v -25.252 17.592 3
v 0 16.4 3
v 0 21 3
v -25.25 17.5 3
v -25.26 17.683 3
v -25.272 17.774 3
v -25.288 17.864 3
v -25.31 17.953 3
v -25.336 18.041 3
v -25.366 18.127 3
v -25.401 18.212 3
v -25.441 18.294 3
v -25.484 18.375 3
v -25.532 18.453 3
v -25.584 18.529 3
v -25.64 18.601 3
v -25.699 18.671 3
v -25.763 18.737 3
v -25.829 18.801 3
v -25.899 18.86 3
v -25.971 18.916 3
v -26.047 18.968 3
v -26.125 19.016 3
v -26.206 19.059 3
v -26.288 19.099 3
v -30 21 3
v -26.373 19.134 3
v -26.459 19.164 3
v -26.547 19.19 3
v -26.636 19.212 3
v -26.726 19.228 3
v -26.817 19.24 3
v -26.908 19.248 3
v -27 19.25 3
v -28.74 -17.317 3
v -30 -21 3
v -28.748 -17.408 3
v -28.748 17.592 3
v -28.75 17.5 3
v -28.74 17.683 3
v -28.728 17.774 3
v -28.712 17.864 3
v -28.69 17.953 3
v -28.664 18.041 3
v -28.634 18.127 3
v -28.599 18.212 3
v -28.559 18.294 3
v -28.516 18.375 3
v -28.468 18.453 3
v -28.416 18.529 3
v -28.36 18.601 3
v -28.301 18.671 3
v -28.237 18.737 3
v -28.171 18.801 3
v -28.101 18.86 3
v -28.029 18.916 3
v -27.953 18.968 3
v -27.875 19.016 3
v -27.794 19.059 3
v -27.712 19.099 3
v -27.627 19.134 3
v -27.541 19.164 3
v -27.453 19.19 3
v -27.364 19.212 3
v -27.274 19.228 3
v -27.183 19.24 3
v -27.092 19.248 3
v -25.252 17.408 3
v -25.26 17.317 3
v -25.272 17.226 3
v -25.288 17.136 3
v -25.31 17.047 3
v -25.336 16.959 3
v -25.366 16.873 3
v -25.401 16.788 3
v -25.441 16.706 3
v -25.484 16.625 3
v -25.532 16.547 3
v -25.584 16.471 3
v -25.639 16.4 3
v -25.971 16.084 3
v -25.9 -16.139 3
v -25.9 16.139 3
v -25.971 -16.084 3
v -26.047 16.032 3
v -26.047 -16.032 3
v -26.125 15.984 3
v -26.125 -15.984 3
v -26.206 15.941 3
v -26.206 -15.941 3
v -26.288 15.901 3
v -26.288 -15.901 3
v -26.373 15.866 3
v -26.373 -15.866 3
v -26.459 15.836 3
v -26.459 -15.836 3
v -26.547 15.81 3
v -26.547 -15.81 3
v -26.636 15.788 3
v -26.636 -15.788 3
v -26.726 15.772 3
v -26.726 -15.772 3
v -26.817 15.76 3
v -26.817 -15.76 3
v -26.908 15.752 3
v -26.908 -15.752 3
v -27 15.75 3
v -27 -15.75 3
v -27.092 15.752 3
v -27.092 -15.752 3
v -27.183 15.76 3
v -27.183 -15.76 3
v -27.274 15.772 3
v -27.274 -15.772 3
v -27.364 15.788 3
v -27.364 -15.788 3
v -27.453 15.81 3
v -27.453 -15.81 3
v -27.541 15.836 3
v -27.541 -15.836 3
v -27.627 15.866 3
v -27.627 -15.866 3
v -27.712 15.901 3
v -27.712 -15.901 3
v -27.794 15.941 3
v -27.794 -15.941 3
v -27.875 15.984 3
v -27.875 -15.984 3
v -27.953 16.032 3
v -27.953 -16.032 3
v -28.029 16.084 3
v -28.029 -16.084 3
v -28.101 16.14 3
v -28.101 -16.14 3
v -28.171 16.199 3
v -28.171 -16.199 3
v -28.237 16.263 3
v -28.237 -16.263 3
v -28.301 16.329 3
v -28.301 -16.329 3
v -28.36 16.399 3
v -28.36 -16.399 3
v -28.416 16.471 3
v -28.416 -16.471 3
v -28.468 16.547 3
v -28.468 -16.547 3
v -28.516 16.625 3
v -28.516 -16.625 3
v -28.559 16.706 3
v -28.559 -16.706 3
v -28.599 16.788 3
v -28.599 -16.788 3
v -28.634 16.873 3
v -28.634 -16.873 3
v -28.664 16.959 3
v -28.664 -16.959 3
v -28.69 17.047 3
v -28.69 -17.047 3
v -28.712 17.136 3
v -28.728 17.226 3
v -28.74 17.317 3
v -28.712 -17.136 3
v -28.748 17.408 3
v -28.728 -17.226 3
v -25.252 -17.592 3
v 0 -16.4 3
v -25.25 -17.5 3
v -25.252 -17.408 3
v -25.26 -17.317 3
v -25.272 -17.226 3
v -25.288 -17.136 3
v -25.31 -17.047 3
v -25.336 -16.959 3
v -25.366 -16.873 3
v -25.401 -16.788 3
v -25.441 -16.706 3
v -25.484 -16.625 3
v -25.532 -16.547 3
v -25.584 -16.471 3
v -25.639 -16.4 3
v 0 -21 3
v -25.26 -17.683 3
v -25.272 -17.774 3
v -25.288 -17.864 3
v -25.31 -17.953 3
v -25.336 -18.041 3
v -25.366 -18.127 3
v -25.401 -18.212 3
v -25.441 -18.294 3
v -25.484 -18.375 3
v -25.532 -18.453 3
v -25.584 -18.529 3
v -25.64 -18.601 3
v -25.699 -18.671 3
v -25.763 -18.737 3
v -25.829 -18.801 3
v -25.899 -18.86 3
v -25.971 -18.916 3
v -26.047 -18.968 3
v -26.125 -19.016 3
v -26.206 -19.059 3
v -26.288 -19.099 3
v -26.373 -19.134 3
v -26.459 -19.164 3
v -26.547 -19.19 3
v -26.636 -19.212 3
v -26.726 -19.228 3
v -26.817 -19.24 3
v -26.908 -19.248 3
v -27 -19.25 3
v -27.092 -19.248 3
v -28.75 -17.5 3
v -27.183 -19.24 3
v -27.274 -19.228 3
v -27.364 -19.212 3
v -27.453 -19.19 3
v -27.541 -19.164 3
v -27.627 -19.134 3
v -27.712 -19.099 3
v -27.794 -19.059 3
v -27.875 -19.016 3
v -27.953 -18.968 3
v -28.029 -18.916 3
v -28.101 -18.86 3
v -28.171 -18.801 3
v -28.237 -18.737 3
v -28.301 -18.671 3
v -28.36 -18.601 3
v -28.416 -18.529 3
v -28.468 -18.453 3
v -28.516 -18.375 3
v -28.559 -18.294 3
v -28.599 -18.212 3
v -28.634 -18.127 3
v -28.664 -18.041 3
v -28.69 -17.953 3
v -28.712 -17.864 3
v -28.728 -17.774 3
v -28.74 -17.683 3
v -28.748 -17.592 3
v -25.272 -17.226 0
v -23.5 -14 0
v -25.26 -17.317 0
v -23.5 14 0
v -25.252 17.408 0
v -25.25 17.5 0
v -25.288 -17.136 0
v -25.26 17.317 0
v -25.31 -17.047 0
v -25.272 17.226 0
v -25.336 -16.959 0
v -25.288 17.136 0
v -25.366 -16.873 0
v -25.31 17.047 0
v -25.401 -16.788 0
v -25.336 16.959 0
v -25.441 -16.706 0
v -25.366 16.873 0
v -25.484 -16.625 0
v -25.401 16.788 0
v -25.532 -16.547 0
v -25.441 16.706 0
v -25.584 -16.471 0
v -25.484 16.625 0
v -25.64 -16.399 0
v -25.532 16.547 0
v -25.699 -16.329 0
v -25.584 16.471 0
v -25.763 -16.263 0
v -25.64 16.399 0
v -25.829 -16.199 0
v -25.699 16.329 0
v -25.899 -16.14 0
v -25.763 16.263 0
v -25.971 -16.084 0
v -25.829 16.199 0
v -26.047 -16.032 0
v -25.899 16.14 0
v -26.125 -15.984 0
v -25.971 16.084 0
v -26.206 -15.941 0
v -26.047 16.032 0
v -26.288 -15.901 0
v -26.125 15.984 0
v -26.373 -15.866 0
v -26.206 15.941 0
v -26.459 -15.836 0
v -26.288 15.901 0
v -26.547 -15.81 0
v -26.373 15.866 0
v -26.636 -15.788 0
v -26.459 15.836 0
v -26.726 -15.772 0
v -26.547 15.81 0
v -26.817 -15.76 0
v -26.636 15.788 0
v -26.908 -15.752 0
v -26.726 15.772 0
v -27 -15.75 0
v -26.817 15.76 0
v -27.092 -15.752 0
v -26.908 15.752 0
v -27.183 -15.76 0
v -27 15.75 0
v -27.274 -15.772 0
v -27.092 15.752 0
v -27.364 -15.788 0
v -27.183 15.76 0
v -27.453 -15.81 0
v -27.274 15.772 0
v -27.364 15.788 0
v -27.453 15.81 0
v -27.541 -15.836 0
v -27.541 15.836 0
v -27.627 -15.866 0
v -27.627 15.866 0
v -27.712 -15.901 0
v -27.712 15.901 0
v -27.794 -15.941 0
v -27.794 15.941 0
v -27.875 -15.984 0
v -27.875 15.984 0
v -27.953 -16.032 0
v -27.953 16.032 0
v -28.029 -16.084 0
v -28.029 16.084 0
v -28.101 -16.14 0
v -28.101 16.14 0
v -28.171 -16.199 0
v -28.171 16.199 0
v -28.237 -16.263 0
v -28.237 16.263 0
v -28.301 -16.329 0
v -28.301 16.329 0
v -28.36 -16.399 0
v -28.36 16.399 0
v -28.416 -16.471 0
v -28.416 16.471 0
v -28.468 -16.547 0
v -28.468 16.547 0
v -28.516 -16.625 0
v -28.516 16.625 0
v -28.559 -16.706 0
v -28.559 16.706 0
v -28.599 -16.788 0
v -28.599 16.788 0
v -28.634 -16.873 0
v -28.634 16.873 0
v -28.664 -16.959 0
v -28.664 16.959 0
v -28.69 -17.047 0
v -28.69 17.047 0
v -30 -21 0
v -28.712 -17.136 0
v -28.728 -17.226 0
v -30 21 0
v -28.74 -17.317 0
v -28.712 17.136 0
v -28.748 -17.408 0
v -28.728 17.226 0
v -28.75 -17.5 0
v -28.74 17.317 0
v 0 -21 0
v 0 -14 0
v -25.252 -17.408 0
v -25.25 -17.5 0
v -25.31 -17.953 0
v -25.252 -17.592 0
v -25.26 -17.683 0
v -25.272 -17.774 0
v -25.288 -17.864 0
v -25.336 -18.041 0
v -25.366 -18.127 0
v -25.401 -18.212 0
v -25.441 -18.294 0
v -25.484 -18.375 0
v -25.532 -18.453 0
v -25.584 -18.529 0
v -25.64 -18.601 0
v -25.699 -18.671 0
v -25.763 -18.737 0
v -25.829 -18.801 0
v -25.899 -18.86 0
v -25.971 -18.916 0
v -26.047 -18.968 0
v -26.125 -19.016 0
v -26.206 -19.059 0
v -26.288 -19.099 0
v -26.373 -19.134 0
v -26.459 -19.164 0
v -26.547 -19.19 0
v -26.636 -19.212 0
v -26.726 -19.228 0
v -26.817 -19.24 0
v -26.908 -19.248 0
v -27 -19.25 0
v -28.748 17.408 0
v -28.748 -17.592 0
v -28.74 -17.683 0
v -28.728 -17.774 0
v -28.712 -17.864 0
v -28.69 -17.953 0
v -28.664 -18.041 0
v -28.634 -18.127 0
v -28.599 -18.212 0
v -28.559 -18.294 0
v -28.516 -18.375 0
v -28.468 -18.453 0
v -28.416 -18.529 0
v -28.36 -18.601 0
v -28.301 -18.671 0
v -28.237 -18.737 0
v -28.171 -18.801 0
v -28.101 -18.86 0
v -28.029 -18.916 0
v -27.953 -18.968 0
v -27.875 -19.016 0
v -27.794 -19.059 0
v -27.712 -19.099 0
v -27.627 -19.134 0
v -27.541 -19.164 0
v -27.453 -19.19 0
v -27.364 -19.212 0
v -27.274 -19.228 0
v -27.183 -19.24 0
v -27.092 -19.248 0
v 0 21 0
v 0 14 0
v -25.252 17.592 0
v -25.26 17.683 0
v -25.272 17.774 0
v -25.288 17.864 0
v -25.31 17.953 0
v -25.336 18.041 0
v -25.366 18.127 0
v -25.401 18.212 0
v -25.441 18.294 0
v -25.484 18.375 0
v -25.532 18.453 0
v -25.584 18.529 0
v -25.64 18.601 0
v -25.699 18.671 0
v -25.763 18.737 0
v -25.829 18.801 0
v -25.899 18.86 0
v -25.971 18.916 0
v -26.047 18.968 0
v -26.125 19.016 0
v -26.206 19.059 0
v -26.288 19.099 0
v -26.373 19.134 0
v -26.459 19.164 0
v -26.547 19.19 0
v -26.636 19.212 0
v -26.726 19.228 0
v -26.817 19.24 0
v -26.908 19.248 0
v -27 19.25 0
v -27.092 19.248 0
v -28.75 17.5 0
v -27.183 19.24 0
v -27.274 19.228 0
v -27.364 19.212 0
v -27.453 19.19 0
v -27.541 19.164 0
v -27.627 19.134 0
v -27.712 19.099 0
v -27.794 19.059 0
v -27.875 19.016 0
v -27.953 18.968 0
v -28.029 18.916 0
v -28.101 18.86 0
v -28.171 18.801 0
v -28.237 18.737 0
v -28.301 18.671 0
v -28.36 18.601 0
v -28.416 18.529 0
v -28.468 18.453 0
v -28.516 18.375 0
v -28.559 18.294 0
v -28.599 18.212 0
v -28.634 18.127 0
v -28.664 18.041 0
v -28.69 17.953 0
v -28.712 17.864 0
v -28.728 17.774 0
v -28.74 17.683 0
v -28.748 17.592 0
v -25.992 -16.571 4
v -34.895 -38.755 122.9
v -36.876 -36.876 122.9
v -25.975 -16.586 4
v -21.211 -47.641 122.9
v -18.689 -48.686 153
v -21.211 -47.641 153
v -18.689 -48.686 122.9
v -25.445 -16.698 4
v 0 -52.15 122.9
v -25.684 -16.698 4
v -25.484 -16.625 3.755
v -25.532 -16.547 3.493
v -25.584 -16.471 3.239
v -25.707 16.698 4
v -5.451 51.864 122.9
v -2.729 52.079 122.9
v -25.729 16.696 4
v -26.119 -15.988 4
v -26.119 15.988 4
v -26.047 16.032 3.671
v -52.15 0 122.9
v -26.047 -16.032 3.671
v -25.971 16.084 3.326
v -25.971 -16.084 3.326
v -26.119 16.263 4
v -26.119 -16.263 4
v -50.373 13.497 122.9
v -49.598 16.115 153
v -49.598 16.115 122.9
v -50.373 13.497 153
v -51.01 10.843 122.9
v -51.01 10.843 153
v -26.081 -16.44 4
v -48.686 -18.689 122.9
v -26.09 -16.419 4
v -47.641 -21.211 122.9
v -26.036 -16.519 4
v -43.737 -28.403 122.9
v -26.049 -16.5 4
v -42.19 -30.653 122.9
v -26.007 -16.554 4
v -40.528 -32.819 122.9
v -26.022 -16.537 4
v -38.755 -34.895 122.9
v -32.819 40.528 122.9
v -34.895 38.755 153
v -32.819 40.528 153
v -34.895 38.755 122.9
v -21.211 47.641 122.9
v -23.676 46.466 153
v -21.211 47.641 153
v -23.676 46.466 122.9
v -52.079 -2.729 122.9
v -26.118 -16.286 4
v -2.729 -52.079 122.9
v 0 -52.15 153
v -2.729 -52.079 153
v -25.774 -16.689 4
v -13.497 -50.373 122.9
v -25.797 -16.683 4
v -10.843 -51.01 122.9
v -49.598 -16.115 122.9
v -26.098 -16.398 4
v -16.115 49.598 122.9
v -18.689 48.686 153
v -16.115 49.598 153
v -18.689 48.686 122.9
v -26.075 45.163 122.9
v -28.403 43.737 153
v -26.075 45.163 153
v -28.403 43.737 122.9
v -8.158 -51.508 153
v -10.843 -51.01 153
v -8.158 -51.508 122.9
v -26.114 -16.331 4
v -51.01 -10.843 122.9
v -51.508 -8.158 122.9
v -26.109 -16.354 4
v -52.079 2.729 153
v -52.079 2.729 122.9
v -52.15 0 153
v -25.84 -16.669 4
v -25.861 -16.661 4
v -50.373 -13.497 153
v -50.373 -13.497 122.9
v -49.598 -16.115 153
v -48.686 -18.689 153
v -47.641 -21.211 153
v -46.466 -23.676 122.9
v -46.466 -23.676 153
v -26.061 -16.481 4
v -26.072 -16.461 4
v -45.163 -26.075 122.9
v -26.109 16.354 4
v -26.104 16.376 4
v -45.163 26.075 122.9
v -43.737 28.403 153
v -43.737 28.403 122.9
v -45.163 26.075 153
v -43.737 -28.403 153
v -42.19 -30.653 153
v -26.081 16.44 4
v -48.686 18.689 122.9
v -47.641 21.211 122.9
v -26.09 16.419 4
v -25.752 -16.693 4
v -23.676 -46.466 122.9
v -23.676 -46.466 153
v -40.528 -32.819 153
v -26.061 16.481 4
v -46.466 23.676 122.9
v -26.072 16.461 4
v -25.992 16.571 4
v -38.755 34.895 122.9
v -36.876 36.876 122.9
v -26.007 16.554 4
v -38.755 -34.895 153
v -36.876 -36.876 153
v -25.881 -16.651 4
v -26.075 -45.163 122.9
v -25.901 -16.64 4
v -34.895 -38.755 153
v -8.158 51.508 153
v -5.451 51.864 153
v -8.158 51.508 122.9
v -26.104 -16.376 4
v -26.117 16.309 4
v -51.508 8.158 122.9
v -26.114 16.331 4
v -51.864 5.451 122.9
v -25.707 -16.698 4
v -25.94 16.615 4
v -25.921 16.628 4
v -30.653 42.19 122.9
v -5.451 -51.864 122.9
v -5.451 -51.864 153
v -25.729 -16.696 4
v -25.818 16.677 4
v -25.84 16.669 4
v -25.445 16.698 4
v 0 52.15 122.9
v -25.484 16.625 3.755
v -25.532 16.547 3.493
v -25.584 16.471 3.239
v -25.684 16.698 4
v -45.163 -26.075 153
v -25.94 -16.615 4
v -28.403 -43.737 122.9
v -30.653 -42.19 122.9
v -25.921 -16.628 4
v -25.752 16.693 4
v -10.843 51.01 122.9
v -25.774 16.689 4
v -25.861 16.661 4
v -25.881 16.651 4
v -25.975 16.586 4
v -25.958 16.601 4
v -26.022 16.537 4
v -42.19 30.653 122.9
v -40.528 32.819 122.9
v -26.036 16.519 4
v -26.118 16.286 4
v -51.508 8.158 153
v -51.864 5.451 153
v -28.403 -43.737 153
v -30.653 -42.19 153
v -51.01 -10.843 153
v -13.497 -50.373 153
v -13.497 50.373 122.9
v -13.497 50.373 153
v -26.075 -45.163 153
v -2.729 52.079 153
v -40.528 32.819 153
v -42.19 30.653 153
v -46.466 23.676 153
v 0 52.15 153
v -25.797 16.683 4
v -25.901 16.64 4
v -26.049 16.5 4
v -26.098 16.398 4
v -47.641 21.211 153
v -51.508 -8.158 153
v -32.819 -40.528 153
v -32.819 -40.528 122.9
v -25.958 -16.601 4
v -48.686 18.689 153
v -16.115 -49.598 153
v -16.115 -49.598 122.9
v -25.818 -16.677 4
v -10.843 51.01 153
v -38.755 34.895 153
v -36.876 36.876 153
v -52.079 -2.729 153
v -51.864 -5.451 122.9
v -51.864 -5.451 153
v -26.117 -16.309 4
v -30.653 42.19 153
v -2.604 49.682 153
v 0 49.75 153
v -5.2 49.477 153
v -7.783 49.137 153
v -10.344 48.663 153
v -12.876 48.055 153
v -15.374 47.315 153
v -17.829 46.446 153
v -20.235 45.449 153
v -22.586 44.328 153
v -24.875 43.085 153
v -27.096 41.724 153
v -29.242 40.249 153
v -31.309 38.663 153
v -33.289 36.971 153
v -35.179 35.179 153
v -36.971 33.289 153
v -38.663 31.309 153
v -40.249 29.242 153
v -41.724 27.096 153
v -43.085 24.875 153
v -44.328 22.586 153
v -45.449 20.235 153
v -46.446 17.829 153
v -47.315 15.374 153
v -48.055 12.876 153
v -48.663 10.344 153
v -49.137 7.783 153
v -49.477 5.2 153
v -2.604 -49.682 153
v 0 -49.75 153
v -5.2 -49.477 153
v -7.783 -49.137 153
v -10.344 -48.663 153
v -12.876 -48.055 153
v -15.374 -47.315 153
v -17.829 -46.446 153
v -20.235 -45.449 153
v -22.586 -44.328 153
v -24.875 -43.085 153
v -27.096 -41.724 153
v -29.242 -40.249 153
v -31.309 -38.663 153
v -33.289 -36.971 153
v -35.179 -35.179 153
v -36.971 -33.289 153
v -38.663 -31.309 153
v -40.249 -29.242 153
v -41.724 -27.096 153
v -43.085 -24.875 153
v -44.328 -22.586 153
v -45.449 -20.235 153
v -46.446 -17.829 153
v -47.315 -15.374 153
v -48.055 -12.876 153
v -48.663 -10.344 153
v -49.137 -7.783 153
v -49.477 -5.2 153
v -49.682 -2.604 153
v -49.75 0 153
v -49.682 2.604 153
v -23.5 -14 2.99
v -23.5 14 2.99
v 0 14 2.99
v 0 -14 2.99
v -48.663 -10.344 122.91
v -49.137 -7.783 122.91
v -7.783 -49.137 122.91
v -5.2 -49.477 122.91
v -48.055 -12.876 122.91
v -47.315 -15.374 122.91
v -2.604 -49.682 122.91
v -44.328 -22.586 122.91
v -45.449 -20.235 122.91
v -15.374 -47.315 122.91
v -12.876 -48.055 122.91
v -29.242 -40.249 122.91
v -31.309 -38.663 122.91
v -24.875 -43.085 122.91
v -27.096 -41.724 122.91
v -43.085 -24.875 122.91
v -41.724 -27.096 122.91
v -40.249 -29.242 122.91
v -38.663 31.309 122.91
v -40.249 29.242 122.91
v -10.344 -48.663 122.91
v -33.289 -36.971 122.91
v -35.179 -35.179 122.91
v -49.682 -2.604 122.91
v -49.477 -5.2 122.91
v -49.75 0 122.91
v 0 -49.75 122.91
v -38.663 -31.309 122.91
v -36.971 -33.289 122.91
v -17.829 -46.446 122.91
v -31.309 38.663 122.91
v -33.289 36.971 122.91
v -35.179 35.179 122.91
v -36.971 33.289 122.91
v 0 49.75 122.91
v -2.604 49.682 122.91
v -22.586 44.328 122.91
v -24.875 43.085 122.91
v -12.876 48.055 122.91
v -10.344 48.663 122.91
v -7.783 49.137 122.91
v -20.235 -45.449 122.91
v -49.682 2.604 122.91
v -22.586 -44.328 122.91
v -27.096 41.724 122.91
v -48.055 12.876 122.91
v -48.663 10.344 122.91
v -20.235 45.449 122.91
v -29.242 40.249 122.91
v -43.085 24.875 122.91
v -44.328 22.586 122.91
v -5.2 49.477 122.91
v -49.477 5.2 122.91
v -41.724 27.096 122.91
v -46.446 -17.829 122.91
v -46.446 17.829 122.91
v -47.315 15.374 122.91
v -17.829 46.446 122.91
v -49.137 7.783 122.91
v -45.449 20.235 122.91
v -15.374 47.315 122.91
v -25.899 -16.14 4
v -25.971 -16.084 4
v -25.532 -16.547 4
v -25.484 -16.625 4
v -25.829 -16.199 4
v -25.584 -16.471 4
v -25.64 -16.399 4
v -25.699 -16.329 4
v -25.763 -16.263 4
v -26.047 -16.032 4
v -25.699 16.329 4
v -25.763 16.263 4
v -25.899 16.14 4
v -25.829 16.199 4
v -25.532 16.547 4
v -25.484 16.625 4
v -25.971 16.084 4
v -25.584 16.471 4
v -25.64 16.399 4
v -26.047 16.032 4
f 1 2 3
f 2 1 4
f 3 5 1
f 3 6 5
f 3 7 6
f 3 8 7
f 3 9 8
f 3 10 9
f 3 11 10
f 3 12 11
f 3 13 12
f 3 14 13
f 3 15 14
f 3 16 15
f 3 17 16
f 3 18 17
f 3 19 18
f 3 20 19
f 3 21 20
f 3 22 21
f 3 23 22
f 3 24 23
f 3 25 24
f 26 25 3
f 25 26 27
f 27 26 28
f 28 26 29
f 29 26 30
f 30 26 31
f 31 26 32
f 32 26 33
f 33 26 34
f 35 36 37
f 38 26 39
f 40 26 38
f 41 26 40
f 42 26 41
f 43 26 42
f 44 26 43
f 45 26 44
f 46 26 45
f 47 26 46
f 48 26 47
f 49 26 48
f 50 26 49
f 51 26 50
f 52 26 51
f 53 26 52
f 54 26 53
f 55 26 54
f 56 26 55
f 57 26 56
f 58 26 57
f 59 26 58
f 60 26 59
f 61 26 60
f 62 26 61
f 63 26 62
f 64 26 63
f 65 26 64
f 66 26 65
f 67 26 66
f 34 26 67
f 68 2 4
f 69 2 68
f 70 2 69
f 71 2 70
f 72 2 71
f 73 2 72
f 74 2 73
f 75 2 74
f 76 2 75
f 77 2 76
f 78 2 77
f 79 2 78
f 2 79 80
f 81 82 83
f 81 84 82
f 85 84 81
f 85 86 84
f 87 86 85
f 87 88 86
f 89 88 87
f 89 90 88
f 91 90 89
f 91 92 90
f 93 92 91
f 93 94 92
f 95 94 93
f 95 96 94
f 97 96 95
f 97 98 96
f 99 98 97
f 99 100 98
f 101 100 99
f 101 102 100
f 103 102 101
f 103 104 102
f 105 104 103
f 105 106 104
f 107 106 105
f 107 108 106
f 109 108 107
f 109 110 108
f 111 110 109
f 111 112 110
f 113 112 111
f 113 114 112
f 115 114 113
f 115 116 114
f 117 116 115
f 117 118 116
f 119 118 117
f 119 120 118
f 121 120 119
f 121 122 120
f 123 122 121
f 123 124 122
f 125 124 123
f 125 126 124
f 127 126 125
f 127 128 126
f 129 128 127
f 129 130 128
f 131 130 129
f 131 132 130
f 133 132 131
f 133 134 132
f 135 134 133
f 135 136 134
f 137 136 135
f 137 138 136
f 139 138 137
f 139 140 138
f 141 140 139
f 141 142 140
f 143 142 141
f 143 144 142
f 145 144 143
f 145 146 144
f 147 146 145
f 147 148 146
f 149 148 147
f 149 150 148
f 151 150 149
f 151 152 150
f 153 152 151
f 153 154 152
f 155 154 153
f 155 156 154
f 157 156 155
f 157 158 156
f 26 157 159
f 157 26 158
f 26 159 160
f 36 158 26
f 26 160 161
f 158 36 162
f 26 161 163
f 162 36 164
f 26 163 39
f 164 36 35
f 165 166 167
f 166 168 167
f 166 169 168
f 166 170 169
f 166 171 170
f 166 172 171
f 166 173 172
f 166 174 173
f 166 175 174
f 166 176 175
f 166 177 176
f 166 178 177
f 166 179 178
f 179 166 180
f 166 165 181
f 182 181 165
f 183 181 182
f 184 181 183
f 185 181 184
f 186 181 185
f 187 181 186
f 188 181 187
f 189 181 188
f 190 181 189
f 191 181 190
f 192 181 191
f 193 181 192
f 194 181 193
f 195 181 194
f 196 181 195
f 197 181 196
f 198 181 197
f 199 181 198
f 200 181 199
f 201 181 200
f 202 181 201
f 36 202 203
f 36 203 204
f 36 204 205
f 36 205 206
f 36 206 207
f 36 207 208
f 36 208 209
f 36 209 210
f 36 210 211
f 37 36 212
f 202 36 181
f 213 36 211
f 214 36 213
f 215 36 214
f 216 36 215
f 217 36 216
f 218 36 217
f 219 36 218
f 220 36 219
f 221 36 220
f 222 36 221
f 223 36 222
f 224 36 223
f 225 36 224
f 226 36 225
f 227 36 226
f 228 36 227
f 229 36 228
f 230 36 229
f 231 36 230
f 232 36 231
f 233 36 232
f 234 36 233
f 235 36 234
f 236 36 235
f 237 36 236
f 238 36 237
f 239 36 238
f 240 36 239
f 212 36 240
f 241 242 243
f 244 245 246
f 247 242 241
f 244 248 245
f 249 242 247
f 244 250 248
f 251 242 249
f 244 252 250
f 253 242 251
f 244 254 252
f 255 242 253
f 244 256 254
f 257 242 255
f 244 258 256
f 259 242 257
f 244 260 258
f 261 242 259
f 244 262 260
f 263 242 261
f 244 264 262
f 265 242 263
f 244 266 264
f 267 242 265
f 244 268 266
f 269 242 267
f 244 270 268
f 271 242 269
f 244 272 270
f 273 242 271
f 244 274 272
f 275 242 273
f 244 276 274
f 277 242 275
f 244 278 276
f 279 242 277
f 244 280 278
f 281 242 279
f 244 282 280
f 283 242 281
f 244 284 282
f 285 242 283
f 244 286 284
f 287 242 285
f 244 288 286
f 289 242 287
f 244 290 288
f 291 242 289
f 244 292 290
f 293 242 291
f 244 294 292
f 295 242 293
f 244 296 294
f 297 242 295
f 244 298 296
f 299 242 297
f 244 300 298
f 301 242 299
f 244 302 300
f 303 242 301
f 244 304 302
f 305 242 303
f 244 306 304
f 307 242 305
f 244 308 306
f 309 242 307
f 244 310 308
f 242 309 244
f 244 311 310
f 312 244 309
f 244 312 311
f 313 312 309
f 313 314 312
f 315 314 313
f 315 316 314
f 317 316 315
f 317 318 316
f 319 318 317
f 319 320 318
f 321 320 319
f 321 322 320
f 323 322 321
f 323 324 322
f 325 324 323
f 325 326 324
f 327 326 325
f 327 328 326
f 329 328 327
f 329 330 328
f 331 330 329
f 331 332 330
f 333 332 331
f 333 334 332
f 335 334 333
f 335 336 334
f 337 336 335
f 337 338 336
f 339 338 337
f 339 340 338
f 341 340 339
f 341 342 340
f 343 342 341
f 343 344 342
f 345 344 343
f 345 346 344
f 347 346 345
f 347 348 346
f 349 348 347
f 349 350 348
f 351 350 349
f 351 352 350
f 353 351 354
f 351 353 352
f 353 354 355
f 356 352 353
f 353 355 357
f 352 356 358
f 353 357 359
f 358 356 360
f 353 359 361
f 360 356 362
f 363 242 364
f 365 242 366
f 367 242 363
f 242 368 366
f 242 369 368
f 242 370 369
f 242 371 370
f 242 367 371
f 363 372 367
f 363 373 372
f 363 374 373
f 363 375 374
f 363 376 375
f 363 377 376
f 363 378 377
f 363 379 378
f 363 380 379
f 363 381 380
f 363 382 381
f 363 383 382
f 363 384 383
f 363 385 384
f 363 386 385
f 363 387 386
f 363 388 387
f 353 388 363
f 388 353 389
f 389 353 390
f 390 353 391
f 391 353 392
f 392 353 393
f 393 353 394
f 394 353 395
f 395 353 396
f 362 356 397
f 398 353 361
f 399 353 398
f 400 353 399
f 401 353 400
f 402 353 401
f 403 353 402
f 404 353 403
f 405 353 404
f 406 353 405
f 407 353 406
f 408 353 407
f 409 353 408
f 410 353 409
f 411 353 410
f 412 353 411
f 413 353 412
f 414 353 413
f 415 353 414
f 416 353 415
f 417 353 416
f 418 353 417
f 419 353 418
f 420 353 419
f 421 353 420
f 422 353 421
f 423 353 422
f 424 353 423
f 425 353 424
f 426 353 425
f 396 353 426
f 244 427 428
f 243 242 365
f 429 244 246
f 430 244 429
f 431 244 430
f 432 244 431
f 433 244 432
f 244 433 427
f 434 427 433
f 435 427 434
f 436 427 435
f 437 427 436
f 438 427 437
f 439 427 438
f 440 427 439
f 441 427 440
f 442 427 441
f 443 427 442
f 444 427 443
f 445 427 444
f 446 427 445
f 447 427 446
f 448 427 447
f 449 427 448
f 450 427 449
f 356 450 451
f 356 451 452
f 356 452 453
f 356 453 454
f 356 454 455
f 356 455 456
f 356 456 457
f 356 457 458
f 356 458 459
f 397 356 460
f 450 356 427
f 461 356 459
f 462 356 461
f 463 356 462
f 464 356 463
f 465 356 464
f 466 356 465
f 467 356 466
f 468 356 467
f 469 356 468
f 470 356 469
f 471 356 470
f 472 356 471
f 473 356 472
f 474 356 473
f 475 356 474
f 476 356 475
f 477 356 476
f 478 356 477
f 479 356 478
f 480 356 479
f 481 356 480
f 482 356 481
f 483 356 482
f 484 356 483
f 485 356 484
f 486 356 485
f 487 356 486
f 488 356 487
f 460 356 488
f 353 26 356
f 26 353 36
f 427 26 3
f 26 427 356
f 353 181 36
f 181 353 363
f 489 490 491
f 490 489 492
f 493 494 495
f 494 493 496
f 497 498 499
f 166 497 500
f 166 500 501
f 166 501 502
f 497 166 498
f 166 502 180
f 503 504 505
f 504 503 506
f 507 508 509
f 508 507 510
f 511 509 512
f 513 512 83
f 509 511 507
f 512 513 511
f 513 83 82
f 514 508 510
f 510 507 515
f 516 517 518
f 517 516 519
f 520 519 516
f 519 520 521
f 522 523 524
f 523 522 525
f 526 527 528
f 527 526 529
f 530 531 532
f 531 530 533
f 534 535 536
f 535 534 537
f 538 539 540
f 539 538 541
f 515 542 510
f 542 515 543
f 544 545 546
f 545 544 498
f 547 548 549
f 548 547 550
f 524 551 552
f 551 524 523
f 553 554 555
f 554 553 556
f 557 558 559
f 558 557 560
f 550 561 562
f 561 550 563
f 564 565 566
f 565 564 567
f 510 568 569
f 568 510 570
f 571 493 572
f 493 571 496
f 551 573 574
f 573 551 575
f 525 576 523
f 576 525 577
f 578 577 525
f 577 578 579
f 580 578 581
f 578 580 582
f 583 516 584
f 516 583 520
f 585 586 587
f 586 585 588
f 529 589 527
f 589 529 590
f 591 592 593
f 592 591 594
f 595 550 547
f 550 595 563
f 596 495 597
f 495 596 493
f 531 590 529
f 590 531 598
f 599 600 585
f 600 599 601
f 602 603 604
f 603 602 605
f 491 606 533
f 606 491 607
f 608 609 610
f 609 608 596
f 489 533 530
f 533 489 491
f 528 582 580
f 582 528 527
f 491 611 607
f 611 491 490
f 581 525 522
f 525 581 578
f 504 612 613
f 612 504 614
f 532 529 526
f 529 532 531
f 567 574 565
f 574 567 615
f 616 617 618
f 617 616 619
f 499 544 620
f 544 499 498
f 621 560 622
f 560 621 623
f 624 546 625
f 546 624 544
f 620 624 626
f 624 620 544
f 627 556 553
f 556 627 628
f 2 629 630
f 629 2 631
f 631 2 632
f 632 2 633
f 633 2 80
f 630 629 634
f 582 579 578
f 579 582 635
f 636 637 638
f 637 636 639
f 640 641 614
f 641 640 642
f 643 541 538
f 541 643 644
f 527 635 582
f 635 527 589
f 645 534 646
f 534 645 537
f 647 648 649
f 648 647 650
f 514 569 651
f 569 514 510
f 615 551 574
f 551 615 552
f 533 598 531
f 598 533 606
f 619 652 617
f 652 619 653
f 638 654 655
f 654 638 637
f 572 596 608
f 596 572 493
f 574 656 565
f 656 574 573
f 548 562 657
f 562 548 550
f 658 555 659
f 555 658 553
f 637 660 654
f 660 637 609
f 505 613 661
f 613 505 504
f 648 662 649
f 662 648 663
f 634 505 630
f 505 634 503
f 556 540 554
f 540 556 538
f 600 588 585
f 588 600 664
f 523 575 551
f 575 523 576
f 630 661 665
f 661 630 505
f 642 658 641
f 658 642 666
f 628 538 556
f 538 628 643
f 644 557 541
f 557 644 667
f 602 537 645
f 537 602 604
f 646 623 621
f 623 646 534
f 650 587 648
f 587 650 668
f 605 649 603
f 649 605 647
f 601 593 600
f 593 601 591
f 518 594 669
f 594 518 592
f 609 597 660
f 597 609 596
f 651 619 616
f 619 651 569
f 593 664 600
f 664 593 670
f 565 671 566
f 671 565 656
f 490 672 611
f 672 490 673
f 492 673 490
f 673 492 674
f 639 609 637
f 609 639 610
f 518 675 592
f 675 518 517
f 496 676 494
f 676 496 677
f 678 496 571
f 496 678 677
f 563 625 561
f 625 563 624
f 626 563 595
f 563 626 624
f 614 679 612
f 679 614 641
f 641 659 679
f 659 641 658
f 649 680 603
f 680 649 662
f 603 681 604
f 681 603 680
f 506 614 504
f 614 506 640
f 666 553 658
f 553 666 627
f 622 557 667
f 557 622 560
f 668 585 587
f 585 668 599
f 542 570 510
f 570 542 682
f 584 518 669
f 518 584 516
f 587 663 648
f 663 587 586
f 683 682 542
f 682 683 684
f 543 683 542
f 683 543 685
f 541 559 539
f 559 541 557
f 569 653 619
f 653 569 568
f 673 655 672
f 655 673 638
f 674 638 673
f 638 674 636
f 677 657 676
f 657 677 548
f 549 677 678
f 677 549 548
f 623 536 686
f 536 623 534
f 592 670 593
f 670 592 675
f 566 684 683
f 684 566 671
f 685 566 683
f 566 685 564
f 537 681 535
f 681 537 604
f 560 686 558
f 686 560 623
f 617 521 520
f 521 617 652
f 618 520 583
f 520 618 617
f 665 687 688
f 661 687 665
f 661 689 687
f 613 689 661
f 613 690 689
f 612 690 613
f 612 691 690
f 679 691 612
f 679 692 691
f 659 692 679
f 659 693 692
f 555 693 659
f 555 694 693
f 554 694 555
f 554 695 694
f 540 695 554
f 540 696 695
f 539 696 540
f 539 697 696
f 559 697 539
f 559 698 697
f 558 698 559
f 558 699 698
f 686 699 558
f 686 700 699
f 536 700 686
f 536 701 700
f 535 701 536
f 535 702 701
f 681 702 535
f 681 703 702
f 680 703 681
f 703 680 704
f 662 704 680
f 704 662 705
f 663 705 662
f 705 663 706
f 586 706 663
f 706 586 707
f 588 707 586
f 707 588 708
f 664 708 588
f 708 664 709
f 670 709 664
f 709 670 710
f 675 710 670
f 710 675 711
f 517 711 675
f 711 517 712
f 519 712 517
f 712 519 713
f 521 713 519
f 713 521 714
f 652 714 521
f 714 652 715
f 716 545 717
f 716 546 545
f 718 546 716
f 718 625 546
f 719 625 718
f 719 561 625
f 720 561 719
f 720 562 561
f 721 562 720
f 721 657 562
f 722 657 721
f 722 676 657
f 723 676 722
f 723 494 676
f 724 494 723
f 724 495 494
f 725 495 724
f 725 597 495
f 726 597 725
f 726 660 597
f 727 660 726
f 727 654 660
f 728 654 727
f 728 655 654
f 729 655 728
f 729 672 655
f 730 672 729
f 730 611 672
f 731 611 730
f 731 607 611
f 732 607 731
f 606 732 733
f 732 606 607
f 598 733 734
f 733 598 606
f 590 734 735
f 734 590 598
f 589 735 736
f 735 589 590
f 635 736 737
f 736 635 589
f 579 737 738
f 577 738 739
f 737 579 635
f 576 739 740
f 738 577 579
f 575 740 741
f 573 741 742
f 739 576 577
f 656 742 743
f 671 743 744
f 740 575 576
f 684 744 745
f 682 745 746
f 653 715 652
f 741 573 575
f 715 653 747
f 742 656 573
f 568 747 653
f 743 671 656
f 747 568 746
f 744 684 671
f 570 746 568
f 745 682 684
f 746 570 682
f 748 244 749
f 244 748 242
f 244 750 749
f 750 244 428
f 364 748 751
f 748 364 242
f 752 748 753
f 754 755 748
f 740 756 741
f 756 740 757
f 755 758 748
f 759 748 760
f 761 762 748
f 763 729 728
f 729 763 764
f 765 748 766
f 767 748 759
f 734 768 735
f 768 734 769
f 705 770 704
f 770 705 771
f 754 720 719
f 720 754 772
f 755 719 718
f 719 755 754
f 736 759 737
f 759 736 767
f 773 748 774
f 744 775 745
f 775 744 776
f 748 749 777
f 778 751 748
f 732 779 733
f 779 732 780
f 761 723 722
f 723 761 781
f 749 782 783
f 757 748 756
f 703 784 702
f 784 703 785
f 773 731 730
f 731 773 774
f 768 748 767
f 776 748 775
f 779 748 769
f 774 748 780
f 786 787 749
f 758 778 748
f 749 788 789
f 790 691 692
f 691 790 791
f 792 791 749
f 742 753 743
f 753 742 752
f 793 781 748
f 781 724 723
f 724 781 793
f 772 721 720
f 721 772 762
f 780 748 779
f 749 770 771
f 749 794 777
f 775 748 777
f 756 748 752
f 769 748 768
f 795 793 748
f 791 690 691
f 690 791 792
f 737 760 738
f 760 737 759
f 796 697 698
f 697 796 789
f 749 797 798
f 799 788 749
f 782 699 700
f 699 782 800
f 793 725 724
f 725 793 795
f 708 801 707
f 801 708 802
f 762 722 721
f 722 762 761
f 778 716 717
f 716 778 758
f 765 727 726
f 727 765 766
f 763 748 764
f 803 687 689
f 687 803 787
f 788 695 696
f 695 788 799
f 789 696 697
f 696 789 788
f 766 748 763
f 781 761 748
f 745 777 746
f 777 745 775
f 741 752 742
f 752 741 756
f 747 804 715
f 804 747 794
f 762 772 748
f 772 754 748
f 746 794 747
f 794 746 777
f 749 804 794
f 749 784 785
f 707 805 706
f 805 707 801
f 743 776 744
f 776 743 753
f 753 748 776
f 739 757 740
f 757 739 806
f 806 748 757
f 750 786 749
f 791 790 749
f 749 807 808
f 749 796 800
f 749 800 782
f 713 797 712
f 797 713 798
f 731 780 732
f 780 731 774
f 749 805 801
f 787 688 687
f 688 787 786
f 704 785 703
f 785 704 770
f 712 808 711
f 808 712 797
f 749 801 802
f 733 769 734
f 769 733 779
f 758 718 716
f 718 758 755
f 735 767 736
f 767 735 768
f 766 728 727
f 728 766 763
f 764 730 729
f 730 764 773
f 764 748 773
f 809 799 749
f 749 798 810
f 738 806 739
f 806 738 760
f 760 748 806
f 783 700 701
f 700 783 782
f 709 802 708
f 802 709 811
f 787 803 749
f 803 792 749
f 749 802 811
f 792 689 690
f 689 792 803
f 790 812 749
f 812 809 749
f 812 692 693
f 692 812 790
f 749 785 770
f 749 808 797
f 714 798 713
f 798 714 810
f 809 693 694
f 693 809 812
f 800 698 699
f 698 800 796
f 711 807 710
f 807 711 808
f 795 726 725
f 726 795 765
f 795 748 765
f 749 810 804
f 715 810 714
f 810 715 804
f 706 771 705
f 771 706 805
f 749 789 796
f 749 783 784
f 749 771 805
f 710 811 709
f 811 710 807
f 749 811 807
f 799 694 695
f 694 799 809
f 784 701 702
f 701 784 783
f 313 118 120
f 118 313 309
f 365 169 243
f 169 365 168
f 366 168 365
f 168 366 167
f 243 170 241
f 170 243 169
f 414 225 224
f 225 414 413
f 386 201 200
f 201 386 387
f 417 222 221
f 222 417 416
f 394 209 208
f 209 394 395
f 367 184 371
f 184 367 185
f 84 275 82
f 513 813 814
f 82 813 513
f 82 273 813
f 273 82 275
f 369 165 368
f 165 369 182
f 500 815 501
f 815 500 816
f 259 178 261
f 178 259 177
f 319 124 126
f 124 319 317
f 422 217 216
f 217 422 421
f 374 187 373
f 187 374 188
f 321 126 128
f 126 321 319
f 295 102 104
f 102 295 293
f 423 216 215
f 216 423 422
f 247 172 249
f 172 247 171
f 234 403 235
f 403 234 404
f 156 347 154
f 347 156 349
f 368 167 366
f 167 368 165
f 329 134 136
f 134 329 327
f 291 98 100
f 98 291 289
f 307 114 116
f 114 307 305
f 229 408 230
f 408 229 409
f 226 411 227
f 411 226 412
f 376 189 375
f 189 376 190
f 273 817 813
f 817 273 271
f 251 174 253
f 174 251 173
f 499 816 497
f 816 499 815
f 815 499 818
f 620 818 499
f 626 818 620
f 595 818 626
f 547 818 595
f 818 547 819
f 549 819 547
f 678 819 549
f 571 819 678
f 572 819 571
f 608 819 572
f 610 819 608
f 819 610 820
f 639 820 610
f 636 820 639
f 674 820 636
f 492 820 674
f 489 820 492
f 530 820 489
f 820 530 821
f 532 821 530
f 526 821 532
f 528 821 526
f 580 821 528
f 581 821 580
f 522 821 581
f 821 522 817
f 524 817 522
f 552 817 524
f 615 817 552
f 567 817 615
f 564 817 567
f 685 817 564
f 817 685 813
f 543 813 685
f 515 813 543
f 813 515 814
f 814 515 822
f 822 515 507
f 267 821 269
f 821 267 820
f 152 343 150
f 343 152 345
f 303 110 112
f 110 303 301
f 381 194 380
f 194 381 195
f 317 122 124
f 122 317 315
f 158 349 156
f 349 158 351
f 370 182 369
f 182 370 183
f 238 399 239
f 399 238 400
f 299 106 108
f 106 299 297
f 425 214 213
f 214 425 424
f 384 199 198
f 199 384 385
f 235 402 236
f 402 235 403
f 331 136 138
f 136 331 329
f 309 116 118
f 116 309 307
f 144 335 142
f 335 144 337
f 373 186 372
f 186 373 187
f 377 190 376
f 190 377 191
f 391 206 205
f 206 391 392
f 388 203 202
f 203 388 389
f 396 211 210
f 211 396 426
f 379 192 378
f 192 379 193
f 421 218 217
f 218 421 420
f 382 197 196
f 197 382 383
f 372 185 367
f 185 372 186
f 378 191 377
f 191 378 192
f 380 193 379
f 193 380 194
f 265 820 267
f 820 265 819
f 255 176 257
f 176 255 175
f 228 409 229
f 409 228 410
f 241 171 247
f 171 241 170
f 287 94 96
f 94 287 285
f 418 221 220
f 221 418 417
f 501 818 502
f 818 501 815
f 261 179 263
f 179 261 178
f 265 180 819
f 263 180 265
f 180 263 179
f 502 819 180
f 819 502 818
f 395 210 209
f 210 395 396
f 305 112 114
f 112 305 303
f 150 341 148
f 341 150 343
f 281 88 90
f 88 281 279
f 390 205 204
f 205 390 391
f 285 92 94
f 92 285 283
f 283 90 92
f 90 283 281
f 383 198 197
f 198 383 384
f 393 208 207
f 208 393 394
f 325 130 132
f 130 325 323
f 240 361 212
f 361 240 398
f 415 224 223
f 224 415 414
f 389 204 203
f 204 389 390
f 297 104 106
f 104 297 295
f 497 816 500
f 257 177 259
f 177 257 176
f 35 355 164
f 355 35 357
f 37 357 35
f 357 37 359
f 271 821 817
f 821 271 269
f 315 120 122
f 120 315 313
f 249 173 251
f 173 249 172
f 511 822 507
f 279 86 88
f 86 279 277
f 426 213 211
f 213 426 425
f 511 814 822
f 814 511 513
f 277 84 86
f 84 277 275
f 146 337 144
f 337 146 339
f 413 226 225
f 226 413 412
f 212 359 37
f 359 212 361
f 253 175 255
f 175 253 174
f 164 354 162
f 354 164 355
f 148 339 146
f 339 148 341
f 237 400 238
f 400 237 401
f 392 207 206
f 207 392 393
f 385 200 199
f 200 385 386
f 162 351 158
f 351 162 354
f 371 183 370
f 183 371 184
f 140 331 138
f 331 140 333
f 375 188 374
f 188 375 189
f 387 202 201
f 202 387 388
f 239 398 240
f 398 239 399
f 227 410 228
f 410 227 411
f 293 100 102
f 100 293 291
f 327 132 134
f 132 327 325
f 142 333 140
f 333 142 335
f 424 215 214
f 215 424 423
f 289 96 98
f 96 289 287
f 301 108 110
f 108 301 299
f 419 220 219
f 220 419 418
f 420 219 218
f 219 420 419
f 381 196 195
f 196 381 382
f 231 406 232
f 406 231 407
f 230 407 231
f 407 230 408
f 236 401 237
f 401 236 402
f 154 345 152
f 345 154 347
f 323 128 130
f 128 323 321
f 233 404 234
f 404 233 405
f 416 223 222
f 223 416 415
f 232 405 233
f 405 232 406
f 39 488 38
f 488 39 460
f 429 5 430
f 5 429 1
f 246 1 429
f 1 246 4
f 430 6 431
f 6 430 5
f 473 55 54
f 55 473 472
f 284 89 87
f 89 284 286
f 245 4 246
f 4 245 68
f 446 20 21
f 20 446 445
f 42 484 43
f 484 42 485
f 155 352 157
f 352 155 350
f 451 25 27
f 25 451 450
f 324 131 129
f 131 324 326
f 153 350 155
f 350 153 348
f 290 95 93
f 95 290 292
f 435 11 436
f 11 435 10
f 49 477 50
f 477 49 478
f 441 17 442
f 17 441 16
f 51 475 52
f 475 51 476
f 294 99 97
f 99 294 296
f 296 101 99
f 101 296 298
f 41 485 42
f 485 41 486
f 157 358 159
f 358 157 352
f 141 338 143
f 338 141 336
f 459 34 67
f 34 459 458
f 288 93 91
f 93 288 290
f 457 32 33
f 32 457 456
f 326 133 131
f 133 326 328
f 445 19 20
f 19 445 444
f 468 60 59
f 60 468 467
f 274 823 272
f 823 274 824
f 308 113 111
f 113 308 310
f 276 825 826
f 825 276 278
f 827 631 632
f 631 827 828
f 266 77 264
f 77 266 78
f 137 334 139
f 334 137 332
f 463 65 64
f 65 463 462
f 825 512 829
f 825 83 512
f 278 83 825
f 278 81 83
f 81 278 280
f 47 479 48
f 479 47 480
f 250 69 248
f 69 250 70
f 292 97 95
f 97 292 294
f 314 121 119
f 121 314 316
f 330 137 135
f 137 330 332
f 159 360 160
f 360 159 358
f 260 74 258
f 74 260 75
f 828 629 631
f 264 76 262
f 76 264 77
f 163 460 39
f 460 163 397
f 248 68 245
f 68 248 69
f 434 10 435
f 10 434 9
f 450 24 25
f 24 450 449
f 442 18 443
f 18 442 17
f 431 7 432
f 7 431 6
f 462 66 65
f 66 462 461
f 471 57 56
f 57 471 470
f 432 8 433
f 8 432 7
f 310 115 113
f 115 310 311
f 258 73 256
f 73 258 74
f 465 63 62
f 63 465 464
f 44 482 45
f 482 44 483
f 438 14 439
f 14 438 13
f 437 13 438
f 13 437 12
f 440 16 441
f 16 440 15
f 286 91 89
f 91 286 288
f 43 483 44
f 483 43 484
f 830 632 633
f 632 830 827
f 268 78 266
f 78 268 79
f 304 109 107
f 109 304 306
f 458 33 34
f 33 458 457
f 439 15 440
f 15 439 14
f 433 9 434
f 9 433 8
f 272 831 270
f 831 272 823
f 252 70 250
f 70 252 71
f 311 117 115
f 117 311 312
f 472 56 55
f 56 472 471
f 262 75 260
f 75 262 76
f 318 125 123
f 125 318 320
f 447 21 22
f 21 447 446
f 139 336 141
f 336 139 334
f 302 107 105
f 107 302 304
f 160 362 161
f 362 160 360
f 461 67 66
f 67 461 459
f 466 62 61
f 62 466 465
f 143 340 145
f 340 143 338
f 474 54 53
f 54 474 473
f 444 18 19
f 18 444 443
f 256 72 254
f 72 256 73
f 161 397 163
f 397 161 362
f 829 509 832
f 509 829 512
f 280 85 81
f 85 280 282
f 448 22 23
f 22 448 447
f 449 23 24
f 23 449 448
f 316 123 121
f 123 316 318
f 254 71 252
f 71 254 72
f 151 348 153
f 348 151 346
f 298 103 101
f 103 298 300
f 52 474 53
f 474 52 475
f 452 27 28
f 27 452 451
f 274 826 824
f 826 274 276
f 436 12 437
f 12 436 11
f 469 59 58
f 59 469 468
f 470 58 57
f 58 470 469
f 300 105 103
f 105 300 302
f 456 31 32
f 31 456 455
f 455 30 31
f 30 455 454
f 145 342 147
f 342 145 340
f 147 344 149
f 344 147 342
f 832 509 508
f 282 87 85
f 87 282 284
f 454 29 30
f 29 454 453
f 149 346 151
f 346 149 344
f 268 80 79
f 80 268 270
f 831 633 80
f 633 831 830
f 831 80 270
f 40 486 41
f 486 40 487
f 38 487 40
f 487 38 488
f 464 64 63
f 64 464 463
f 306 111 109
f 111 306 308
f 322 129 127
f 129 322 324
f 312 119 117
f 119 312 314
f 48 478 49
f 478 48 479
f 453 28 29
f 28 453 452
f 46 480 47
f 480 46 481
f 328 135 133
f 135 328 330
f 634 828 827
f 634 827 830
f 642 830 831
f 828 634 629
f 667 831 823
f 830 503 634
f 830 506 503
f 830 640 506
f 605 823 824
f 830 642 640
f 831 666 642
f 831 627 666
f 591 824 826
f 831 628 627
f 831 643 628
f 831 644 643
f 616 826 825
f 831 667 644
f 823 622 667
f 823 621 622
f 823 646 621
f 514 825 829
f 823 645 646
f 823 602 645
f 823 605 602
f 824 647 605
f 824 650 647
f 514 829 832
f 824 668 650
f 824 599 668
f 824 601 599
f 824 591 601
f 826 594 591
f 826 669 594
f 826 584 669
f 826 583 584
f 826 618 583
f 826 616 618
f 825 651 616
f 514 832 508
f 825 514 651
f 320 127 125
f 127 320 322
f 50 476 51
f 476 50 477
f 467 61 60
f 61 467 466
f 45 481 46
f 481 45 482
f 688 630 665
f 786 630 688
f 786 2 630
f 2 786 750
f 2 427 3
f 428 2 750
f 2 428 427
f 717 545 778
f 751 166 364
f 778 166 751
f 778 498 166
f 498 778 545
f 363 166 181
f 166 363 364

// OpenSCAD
// --- PARAMETERS ---
$fn = 120; // Rendering smoothness

// Wall Thickness
wall = 2.4; // Optimized for 3 perimeters with a 0.4mm or 0.6mm nozzle

// Coolerguys Blower Port (Internal Dimensions)
blower_w = 47.0; 
blower_h = 28.0;

// Blower Mounting Flange
flange_w = 60.0;
flange_h = 42.0;
flange_thick = 3.0;
hole_spacing_x = 54.0; // Distance between mounting screw centers
hole_spacing_y = 35.0; 
hole_dia = 3.5;        // M3 screw clearance

// Transition Plenum
//~ plenum_len = 95.0; // ~3.75 inches transition length
plenum_len = 120.0; // ~3.75 inches transition length

// Stovepipe Port (External Dimensions to fit inside 4" pipe)
pipe_id = 99.5; // ~3.92 inches outer diameter for snug fit inside 4" pipe
pipe_len = 30.0; // 30mm insertion depth into the metal pipe

module duct(){
  // --- MAIN ASSEMBLY ---
  difference() {
      union() {
          // 1. Blower Flange Plate
          translate([-flange_w/2, -flange_h/2, 0])
              cube([flange_w, flange_h, flange_thick]);
          
          // 2. Outer Loft (Plenum Body)
          translate([0, 0, flange_thick])
              cylinder_to_rectangle_loft(blower_w + 2*wall, blower_h + 2*wall, pipe_id + 2*wall, plenum_len);
          
          // 3. Outer Stovepipe Cuff
          translate([0, 0, flange_thick + plenum_len])
              cylinder(d = pipe_id + 2*wall, h = pipe_len);
      }
      
      // --- HOLLOW CUTOUTS ---
      union() {
          // 1. Internal Rectangular Airway Pass
          translate([-blower_w/2, -blower_h/2, -1])
              cube([blower_w, blower_h, flange_thick + 2]);
          
          // 2. Internal Loft Airway Pass
          translate([0, 0, flange_thick - 0.01])
              cylinder_to_rectangle_loft(blower_w, blower_h, pipe_id, plenum_len + 0.02);
              
          // 3. Internal Pipe Core Pass
          translate([0, 0, flange_thick + plenum_len])
              cylinder(d = pipe_id, h = pipe_len + 1);
              
          // 4. Screw Mounting Holes through Flange
          translate([-hole_spacing_x/2, -hole_spacing_y/2, -1]) cylinder(d=hole_dia, h=flange_thick+2);
          translate([hole_spacing_x/2, -hole_spacing_y/2, -1])  cylinder(d=hole_dia, h=flange_thick+2);
          translate([-hole_spacing_x/2, hole_spacing_y/2, -1])  cylinder(d=hole_dia, h=flange_thick+2);
          translate([hole_spacing_x/2, hole_spacing_y/2, -1])   cylinder(d=hole_dia, h=flange_thick+2);
      }
  }
}


// --- HELPER MODULE FOR LOFTING ---
module cylinder_to_rectangle_loft(rect_w, rect_h, cyl_d, height) {
    hull() {
        // Bottom Rectangle interface
        translate([-rect_w/2, -rect_h/2, 0])
            cube([rect_w, rect_h, 0.1]);
        
        // Top Cylinder interface
        translate([0, 0, height - 0.1])
            cylinder(d = cyl_d, h = 0.1);
    }
}


//======================================================================

difference(){
  duct();
  translate([100,0,200])
  cube([200,200,400],center=true);
}

//======================================================================
